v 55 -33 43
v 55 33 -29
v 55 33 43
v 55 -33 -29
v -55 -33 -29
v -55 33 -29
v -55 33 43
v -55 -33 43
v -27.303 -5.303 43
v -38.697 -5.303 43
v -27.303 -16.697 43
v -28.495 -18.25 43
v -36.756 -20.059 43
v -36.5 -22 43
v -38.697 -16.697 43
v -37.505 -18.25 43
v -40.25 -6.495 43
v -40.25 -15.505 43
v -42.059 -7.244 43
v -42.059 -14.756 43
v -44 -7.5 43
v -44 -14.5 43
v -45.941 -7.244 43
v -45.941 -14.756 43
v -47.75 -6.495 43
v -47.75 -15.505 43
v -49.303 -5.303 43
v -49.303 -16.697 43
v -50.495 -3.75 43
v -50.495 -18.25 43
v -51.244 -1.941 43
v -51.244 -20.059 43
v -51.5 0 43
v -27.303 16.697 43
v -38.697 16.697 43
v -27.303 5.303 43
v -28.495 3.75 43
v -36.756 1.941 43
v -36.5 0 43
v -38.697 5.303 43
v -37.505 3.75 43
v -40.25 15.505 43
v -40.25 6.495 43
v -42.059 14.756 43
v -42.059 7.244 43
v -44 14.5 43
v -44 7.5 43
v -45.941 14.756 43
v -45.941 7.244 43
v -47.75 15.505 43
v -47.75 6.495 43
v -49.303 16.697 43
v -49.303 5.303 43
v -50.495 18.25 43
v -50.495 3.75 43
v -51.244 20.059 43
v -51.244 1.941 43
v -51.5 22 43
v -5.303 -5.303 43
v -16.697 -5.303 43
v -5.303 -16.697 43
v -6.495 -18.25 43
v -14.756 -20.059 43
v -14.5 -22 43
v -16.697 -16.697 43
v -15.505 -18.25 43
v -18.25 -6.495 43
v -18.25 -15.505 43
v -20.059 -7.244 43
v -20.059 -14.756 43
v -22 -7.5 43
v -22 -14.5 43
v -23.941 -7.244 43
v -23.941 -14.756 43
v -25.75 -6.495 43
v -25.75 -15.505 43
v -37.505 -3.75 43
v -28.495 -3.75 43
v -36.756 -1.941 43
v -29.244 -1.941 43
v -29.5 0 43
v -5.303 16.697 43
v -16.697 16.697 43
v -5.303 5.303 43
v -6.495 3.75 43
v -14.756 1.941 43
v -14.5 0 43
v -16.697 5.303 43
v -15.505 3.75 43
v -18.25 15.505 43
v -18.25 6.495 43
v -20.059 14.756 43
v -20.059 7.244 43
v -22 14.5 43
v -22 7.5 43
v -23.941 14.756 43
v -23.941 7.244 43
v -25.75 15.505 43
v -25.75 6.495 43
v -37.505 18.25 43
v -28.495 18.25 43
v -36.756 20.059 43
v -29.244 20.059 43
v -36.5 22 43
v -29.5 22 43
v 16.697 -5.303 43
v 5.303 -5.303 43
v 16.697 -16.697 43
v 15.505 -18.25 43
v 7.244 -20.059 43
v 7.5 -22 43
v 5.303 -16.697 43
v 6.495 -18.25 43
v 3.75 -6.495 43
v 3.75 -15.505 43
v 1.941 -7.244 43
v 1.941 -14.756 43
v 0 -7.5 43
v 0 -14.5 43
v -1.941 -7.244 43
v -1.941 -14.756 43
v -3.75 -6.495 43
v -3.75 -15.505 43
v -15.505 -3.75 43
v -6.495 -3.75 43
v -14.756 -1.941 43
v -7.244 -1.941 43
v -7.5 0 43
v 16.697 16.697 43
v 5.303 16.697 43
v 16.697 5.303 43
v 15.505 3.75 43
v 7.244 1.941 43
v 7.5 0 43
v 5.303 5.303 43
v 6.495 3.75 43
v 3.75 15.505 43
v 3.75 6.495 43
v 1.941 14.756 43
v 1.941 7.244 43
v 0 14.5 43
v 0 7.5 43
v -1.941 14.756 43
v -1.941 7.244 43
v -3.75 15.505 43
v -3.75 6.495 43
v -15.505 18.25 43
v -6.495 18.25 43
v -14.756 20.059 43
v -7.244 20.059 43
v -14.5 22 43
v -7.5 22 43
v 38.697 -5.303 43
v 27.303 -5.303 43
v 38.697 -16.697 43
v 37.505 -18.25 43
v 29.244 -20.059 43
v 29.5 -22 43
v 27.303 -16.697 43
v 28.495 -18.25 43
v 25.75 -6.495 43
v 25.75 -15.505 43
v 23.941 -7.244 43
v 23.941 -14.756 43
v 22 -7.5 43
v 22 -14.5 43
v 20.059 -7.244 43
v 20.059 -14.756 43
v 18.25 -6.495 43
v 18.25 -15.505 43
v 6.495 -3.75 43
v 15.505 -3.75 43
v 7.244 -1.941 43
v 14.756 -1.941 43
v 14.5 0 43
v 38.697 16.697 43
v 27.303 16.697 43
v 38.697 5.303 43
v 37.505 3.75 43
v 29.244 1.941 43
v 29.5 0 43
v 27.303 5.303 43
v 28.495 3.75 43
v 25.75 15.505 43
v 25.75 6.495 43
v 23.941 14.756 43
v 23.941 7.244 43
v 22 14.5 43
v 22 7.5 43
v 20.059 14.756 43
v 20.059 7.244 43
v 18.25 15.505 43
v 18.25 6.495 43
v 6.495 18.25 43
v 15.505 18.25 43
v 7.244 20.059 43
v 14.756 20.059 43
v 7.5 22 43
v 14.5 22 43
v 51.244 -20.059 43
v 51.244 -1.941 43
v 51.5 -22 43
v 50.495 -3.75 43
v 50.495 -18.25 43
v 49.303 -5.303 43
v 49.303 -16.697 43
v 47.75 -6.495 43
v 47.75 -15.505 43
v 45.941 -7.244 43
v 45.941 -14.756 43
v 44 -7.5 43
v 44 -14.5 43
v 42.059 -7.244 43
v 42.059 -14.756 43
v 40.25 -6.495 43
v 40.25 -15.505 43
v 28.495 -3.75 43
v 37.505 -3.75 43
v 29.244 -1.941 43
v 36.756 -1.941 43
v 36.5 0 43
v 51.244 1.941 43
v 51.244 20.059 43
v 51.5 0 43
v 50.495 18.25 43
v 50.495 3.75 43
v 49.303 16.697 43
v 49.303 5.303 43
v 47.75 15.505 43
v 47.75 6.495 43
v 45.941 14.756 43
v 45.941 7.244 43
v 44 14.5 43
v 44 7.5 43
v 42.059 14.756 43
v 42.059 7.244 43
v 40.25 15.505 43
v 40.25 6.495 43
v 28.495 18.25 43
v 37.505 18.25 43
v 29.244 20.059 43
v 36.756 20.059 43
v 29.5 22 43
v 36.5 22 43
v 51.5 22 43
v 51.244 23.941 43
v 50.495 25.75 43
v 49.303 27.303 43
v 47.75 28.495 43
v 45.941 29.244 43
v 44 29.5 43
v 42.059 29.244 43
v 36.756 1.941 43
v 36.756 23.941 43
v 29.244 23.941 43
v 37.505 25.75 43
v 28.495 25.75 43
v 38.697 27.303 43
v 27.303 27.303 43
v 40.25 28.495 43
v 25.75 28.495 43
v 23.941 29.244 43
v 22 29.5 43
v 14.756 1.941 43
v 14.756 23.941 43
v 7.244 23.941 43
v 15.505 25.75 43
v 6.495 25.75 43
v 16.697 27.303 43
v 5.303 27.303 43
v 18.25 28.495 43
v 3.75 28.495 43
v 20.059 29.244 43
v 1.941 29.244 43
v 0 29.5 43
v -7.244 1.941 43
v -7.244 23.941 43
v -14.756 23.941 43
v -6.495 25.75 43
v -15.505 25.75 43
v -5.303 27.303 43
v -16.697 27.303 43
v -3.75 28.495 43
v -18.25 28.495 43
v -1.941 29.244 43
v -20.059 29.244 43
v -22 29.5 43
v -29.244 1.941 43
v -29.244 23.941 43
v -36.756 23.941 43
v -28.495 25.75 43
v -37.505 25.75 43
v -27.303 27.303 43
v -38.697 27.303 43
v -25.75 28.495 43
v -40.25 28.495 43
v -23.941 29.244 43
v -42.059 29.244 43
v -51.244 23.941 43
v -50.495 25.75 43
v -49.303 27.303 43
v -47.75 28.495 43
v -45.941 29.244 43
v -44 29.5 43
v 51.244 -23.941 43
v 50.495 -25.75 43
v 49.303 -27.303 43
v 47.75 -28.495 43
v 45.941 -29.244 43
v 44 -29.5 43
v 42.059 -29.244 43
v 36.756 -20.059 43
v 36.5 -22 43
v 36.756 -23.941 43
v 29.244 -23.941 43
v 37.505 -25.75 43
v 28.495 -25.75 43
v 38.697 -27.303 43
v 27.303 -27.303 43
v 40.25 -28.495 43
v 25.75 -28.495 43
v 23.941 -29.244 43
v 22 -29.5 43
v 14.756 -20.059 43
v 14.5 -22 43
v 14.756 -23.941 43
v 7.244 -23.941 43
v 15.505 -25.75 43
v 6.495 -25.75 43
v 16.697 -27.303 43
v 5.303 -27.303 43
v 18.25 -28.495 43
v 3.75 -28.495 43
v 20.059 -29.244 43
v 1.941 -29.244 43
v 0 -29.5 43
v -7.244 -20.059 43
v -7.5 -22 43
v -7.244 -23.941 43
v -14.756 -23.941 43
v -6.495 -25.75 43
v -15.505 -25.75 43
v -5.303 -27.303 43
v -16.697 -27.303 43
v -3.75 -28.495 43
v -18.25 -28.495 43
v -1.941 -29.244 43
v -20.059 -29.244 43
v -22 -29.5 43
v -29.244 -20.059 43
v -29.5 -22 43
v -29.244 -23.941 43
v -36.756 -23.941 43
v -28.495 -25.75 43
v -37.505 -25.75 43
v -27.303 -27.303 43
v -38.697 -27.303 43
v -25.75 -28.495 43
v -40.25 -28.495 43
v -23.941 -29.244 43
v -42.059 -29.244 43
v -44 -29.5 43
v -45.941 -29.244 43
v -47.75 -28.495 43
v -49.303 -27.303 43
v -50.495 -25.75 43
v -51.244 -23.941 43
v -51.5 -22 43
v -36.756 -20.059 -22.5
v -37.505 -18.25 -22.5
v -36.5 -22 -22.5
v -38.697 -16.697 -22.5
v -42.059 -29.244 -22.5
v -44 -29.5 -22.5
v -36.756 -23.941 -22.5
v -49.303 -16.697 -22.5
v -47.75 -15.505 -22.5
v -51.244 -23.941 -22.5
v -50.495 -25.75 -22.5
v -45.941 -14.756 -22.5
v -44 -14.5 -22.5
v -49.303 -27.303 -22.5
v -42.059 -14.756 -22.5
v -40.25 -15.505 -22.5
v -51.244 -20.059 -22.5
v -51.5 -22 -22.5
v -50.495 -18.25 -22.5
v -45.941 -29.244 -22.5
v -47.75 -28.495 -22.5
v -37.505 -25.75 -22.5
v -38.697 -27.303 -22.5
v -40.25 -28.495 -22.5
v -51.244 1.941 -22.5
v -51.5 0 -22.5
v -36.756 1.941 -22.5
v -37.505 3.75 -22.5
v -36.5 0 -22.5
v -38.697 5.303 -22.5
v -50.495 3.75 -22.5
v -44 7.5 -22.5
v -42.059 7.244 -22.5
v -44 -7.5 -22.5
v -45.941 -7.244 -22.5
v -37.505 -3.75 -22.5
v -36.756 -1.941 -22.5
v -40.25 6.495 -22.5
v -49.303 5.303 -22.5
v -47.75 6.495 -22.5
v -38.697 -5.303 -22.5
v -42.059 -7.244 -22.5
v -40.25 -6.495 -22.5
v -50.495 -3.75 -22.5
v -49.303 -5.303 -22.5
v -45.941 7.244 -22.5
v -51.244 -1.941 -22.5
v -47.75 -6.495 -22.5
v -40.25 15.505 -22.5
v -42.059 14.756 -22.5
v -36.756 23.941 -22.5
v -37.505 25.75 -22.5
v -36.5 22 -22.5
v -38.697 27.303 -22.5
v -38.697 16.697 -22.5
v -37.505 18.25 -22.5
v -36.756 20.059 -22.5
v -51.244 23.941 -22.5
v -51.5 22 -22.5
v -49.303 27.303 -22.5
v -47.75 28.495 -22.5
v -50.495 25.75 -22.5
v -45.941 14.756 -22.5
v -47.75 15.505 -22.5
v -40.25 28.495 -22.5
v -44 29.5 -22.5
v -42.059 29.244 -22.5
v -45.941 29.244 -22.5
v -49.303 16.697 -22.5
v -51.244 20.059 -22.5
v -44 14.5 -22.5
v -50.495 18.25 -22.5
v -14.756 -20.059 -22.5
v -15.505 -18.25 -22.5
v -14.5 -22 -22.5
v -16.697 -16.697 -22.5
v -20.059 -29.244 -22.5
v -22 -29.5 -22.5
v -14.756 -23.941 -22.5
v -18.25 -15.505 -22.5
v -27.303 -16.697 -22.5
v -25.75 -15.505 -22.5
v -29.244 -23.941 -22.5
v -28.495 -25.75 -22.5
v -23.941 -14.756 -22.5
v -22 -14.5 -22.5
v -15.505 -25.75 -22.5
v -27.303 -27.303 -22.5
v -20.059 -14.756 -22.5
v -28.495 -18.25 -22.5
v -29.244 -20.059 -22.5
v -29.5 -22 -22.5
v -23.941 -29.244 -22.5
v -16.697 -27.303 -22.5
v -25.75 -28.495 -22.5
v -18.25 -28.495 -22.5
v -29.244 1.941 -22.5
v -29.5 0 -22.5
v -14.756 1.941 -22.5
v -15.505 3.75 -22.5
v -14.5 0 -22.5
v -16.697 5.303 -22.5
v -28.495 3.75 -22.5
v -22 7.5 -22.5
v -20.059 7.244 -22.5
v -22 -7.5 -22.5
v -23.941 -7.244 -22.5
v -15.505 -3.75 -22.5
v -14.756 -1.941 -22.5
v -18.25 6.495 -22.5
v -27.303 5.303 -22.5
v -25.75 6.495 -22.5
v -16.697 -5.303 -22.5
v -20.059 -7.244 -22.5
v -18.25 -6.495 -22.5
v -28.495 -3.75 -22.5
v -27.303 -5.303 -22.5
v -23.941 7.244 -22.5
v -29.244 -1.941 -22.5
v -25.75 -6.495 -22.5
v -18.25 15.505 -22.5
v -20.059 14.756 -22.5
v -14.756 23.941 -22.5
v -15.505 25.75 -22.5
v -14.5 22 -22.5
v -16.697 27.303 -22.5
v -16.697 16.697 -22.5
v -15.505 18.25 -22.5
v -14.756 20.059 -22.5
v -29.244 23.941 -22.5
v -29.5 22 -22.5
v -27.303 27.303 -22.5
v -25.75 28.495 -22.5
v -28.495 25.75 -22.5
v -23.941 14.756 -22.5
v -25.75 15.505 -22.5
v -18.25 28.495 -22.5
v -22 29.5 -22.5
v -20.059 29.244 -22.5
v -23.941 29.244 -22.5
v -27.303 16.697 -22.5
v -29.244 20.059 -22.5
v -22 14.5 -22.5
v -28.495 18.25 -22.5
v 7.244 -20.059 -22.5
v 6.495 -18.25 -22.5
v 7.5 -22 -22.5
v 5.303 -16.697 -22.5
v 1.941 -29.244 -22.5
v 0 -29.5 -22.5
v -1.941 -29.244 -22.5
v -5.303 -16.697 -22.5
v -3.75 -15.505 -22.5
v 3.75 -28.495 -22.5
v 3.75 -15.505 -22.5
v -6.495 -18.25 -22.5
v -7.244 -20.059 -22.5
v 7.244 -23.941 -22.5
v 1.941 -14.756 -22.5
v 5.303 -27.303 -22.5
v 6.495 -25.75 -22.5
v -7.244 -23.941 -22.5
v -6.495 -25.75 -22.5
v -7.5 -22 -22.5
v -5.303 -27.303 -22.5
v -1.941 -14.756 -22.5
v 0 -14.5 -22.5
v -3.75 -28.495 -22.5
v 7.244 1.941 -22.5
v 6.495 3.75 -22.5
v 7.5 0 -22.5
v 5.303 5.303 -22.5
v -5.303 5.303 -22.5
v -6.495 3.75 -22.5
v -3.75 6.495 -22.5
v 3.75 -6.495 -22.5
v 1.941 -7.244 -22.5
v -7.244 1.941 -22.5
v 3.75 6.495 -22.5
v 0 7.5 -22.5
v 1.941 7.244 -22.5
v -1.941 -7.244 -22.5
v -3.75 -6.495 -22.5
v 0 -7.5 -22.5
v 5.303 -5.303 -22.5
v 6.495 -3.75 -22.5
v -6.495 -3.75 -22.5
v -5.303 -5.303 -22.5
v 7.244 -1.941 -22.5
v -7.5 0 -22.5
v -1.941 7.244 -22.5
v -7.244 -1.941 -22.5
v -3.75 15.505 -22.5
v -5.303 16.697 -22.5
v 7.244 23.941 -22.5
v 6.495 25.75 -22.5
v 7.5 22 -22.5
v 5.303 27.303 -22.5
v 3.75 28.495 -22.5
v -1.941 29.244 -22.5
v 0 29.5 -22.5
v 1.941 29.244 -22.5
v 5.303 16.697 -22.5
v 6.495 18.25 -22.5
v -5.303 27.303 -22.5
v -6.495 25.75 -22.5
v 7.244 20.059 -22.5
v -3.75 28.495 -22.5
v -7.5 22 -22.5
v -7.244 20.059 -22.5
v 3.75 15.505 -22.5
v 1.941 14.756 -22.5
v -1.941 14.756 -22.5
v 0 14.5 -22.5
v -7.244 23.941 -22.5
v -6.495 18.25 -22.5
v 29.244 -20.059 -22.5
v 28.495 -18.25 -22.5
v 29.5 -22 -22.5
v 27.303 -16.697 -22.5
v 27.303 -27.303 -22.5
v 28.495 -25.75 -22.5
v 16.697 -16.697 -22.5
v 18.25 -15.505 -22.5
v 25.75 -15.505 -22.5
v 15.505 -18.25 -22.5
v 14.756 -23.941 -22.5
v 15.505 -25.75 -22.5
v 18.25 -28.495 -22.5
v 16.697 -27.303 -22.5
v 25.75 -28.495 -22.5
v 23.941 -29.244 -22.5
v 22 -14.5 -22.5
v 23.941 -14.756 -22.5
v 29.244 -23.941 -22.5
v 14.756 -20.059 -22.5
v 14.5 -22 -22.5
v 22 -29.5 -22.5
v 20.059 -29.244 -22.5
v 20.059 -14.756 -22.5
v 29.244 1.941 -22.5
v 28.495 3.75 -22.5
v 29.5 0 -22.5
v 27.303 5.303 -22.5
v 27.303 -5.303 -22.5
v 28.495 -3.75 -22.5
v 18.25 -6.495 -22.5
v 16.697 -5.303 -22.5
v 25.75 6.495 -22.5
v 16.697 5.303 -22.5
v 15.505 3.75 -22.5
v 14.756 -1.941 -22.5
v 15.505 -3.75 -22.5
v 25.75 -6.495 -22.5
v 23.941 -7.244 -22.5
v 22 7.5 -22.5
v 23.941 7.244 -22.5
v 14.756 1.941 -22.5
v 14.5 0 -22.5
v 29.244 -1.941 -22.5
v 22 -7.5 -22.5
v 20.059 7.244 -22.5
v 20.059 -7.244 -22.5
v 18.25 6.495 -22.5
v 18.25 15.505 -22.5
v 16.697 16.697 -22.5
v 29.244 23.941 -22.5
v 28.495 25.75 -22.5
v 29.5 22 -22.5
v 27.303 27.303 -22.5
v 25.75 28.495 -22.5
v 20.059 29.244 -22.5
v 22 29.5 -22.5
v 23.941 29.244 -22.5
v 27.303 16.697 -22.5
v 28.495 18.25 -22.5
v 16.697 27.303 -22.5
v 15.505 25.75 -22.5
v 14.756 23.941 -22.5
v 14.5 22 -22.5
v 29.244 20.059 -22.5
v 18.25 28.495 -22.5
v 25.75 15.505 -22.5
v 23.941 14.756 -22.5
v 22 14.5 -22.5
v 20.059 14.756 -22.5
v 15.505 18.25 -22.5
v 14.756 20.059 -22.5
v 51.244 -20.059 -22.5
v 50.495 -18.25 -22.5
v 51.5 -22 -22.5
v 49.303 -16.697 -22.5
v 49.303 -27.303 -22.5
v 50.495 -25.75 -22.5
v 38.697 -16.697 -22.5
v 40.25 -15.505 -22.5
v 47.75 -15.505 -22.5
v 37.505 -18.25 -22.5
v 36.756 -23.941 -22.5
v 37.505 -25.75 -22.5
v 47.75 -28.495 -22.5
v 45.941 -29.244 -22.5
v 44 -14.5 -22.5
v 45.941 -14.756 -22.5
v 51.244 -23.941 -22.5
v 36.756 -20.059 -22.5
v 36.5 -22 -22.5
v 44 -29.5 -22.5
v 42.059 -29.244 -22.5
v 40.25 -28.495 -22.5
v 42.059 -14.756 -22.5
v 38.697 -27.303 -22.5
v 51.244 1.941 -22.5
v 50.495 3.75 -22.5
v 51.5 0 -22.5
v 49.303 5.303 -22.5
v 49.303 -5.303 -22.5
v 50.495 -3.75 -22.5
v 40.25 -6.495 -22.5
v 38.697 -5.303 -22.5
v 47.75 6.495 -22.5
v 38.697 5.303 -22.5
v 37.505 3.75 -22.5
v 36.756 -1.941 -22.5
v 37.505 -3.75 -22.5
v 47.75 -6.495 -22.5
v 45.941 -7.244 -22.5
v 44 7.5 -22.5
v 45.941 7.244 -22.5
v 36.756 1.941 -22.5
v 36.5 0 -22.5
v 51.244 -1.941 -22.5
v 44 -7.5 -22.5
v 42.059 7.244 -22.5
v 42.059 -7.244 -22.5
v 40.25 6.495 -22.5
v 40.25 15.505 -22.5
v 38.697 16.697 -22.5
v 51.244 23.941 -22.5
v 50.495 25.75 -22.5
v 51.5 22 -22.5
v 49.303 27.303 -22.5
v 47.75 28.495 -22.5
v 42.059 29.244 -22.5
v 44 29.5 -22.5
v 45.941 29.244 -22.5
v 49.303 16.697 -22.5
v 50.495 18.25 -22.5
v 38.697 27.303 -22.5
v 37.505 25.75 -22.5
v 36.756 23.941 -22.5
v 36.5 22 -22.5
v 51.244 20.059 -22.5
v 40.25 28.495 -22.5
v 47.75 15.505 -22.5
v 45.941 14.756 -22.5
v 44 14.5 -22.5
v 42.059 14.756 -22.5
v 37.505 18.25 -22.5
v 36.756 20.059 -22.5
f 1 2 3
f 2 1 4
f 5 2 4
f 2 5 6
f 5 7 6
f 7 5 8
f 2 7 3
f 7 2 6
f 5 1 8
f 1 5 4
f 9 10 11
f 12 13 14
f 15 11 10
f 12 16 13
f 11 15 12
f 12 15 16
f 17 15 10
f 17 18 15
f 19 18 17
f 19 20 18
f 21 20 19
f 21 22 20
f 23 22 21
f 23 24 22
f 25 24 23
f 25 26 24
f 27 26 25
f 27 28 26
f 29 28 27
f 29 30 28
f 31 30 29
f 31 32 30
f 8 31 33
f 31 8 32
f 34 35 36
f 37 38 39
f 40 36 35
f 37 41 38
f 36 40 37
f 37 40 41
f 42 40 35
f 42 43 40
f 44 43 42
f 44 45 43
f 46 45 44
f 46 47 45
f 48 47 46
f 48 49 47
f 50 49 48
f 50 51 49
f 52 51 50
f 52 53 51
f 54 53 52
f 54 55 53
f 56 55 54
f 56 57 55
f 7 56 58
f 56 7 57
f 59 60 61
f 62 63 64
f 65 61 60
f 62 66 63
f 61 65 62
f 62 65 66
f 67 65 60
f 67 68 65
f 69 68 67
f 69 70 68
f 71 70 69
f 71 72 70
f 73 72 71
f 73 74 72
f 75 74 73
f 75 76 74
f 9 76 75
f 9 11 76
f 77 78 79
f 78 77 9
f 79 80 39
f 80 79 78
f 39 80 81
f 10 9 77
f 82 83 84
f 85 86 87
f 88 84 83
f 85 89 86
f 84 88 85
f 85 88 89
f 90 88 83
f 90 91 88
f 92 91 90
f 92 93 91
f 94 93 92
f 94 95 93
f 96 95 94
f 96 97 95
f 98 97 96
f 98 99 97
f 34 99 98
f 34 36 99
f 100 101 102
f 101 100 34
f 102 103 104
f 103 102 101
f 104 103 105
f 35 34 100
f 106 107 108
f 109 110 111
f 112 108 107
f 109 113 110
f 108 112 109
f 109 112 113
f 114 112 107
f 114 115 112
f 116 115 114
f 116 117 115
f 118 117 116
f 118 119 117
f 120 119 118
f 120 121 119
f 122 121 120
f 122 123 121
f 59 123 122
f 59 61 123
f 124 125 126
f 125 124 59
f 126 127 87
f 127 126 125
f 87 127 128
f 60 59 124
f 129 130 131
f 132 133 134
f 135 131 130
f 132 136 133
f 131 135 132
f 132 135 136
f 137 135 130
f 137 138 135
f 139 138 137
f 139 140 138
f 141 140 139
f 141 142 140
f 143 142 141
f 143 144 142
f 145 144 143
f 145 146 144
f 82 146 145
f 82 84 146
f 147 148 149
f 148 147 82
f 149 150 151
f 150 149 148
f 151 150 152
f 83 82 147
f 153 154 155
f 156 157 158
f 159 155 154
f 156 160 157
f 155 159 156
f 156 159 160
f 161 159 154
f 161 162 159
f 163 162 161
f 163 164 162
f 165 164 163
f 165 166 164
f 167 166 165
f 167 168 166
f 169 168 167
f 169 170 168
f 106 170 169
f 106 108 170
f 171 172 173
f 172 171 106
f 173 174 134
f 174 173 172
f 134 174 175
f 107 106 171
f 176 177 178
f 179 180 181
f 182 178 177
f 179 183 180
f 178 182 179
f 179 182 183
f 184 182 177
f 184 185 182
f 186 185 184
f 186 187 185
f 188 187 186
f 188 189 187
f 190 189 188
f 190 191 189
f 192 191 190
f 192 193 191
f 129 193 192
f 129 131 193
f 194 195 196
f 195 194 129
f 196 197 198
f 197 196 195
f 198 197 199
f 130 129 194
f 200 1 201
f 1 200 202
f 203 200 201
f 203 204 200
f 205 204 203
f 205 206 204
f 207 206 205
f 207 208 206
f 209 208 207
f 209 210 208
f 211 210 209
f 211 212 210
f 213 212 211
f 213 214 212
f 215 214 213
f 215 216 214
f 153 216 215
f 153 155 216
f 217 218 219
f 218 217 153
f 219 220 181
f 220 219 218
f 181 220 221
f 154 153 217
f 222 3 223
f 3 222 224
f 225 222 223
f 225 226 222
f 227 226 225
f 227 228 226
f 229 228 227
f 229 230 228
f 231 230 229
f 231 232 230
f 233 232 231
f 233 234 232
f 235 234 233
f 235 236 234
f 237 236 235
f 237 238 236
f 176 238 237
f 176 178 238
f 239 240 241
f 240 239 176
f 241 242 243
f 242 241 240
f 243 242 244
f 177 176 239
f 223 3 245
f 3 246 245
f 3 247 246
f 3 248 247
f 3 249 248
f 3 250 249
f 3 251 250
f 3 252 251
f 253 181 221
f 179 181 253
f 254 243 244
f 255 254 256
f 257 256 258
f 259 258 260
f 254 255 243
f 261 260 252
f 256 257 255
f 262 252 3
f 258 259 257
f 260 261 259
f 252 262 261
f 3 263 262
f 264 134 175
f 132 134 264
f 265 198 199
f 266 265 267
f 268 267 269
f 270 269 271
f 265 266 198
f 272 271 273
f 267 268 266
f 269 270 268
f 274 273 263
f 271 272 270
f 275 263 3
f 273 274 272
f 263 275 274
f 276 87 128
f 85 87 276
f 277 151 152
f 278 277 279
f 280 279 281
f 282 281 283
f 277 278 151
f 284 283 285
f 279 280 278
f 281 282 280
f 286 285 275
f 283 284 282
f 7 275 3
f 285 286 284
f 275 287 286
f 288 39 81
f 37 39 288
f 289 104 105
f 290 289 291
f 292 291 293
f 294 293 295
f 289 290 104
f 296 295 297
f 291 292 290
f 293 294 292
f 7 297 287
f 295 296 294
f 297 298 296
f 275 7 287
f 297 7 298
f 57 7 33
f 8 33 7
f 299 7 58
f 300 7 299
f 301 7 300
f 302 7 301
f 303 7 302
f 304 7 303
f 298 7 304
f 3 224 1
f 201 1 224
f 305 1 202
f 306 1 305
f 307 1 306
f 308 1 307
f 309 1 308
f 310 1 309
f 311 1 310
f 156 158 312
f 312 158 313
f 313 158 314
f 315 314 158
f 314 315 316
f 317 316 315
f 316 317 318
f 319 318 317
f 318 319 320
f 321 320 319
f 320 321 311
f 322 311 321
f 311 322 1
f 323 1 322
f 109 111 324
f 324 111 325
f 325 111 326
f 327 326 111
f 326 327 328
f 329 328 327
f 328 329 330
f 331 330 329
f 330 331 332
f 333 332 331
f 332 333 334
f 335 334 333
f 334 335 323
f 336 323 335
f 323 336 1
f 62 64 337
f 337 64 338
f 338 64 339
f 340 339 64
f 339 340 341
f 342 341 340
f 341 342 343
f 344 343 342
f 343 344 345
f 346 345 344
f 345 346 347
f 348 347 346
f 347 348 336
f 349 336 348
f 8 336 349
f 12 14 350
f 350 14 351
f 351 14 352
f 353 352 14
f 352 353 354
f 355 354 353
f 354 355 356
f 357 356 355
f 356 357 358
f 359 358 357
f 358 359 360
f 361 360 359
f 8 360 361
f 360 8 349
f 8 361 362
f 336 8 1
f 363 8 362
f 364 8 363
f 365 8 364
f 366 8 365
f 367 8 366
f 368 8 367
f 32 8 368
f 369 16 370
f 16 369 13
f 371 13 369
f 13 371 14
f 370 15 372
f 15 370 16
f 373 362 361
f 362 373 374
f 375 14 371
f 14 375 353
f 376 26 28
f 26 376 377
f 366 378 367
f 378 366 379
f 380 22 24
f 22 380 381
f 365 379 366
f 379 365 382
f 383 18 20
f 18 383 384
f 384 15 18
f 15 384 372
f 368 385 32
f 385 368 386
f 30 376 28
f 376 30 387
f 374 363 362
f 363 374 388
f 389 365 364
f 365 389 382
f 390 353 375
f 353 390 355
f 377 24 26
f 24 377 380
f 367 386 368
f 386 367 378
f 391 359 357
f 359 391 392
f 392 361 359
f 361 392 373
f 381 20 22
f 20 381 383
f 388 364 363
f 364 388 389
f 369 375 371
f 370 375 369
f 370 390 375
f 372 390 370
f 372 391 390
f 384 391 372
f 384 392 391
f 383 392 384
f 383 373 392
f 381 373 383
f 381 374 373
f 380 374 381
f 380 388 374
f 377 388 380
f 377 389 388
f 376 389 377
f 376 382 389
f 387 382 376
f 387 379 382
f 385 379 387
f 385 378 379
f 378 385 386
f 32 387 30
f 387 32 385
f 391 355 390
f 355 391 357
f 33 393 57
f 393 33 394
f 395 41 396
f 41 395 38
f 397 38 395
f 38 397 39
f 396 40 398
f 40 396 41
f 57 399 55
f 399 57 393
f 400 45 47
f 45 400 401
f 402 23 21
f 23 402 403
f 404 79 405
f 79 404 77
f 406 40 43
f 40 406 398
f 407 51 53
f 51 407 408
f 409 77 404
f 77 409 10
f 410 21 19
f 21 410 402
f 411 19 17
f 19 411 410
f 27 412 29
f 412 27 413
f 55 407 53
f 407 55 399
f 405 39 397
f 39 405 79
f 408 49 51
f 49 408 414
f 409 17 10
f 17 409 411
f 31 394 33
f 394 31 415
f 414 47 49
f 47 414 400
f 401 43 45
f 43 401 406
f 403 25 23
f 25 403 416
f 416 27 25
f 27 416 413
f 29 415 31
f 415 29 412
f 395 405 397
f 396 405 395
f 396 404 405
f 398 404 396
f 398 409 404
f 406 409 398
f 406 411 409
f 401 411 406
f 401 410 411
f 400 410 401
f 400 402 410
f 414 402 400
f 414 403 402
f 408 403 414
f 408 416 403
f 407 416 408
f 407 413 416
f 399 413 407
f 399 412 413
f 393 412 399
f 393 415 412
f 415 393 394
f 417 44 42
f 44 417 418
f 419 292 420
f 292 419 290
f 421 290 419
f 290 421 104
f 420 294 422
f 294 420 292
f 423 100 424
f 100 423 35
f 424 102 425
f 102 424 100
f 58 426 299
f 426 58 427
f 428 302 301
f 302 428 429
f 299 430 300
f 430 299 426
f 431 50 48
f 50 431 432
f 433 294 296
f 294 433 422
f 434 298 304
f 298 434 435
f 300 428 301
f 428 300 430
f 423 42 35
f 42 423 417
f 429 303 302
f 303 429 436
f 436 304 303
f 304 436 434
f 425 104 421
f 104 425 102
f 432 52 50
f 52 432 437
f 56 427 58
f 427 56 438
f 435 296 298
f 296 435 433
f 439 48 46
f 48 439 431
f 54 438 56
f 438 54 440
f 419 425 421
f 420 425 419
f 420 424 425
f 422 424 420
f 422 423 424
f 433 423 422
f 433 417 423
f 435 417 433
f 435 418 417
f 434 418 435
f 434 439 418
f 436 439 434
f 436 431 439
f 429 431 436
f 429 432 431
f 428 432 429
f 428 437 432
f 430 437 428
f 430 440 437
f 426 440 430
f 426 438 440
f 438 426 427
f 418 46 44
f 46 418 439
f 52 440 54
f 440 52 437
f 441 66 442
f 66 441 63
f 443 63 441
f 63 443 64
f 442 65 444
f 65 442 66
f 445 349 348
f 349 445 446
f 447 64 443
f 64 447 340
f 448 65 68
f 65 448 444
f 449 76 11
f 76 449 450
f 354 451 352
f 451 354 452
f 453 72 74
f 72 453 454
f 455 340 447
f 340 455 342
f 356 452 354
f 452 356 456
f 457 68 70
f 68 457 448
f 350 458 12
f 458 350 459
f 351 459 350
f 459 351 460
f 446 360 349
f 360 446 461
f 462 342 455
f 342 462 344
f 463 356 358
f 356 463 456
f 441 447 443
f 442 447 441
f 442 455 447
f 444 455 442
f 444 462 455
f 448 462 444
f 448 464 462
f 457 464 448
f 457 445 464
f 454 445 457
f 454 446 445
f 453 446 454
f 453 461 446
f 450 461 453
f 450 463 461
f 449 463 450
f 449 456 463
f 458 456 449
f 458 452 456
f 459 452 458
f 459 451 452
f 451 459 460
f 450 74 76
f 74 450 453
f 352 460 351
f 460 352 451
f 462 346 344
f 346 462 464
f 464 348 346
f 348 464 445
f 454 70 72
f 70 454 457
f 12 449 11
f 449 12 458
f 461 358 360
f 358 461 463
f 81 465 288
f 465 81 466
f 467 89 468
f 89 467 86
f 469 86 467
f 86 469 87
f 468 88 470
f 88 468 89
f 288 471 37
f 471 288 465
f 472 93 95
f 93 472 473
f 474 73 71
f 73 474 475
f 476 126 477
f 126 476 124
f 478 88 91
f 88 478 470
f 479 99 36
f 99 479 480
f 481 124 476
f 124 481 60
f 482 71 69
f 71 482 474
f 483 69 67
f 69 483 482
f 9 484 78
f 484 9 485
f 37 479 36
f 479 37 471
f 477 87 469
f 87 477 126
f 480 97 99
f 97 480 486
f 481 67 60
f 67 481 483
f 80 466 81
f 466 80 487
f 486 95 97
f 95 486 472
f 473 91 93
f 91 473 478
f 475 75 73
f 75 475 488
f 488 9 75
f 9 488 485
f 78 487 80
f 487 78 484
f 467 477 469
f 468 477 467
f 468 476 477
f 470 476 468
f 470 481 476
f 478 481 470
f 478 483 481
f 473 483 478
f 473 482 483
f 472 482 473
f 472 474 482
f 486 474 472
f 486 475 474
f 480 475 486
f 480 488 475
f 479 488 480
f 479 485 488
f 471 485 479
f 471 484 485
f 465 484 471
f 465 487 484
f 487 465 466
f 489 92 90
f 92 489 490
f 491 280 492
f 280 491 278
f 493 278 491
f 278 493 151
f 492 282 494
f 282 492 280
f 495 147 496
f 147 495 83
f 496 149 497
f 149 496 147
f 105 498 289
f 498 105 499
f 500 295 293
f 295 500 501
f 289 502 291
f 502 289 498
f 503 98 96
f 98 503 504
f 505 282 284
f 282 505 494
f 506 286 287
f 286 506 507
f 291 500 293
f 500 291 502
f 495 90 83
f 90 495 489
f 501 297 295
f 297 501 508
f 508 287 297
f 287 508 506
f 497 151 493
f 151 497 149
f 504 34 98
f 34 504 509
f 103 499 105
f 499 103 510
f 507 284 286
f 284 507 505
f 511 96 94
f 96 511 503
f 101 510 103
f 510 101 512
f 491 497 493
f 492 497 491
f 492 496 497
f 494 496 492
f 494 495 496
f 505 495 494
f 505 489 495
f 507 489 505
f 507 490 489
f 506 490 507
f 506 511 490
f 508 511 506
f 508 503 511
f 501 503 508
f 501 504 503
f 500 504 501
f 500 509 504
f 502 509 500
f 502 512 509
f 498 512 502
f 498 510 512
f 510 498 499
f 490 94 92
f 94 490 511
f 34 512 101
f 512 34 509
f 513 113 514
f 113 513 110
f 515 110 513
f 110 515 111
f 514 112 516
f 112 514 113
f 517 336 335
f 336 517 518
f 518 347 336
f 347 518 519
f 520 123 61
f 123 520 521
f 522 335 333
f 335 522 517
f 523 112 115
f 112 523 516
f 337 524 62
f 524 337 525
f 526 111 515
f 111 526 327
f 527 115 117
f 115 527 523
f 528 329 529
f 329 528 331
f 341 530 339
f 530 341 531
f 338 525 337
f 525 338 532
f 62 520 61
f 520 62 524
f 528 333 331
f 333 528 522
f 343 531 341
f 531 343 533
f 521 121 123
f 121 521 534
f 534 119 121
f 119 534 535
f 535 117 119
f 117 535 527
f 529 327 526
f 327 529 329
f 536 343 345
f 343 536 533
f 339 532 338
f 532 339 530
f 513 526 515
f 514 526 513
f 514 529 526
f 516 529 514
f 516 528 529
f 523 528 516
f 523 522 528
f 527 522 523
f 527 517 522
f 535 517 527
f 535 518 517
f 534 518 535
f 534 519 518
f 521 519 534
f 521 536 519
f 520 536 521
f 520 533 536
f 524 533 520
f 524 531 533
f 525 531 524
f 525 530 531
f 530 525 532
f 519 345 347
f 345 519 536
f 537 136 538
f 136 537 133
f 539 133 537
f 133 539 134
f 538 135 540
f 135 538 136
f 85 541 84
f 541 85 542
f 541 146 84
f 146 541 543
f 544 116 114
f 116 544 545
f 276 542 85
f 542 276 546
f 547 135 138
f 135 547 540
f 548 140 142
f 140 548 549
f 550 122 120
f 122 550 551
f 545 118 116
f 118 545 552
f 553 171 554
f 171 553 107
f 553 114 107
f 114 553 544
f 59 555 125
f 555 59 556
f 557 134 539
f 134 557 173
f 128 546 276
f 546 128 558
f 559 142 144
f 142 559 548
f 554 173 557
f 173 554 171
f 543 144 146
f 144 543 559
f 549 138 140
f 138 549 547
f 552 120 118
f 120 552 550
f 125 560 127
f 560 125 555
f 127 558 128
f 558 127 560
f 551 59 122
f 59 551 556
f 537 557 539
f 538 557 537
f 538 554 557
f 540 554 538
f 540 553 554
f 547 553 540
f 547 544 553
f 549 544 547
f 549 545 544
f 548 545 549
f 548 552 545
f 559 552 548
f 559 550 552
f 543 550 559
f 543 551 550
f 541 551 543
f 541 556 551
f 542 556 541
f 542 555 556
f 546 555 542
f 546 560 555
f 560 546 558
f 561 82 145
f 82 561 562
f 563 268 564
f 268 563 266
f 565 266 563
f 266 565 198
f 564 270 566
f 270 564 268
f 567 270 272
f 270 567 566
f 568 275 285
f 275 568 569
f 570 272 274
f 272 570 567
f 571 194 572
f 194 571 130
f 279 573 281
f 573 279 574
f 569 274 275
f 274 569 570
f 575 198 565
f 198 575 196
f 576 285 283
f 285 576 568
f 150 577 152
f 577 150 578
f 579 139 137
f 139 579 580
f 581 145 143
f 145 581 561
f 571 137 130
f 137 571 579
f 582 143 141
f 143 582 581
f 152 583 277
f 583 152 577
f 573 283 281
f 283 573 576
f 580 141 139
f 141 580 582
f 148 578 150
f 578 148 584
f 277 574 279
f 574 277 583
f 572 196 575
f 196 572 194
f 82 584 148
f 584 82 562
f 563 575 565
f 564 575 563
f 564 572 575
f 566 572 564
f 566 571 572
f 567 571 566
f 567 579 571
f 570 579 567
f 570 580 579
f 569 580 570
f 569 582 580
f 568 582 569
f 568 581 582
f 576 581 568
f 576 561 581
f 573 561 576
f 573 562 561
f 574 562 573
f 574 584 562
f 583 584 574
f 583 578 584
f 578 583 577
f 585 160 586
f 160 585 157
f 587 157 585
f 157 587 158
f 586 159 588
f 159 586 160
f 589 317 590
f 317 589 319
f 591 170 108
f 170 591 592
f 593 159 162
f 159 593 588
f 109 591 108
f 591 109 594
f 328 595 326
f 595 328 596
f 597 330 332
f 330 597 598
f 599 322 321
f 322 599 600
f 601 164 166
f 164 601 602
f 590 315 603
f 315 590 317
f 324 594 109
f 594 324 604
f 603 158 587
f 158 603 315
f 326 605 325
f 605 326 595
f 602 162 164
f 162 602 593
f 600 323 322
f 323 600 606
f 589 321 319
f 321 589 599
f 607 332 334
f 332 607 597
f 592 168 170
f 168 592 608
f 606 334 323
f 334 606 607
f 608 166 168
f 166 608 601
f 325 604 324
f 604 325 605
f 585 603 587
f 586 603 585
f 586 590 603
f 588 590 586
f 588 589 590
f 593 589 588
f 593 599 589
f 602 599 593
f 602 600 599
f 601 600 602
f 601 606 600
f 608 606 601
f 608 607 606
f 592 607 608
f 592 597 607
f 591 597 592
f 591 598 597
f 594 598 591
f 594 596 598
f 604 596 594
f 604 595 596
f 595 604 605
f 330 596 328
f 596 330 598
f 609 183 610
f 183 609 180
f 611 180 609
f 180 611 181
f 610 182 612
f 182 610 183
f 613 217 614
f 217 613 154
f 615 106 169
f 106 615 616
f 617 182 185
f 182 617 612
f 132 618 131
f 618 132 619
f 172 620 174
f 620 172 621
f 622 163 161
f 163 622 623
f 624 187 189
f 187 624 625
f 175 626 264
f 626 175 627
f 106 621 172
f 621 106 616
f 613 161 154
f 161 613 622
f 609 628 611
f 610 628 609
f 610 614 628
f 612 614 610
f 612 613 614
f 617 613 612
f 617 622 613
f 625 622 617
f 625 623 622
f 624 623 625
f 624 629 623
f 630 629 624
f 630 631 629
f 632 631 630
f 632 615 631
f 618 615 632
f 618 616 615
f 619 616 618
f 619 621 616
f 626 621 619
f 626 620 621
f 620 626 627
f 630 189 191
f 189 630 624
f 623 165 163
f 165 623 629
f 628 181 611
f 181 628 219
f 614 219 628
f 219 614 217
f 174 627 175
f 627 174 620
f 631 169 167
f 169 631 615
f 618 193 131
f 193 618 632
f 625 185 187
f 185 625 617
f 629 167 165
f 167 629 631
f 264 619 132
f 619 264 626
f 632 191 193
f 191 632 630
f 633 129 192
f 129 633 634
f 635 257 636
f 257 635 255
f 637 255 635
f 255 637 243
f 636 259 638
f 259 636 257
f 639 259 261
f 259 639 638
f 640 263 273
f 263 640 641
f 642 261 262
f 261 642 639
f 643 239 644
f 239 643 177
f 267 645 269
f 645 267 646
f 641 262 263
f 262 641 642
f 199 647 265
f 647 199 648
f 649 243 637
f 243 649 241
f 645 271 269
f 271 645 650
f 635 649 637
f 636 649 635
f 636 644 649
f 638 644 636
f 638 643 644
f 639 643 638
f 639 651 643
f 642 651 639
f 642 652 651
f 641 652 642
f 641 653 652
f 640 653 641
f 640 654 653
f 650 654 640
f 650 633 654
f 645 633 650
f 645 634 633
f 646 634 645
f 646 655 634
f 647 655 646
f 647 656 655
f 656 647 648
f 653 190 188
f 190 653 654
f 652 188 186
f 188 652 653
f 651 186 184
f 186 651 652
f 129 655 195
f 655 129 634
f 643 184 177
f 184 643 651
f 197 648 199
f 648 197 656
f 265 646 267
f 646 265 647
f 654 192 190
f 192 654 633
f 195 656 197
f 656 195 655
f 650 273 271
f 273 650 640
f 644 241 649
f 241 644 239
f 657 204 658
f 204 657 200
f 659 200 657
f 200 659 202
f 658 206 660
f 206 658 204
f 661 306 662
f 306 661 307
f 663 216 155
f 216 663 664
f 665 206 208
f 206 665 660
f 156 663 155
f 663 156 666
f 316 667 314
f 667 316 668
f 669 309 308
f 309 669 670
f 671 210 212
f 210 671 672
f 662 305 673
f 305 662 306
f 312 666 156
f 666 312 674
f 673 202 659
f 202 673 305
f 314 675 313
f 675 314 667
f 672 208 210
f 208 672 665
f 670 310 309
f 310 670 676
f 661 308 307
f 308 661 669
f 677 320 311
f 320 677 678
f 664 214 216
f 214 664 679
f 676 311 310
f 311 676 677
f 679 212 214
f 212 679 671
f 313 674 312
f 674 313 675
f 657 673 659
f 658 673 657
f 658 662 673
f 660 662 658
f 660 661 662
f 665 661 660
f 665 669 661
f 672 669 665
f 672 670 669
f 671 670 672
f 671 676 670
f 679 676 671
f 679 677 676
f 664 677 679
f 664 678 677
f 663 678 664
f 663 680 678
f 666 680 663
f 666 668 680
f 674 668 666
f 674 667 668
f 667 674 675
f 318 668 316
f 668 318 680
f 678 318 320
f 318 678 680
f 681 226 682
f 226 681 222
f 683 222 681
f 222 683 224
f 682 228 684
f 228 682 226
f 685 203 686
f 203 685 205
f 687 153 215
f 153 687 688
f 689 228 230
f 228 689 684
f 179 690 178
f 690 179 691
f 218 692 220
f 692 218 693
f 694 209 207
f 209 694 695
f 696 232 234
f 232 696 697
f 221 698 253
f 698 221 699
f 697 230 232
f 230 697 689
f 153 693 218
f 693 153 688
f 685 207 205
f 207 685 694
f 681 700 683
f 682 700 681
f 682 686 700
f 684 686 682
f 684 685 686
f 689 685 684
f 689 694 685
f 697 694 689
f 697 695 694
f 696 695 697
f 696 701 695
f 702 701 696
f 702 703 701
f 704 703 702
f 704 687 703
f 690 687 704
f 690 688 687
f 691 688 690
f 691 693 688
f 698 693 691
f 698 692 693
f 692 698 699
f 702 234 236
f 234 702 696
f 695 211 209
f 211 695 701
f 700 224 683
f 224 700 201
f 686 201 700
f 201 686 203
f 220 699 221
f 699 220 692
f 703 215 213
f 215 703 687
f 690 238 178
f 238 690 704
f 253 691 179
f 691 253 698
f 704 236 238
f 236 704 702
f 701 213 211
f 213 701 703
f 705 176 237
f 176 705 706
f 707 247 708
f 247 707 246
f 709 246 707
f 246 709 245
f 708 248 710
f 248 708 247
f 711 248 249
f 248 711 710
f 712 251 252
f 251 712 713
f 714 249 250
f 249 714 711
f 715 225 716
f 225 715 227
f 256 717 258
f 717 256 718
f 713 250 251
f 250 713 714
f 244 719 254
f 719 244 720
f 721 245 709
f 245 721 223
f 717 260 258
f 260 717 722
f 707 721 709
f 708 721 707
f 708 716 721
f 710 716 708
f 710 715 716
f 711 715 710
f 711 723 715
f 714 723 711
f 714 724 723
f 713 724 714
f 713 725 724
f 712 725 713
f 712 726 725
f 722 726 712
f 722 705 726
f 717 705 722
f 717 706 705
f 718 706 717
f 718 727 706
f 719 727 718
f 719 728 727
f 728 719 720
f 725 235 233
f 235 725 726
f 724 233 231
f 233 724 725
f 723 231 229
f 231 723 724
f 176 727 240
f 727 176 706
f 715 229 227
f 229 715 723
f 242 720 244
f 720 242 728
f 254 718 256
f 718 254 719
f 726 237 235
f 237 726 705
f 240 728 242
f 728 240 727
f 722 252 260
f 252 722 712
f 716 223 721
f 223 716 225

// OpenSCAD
// 3DScad sample: laboratory test tube rack (5 x 3 wells)
// Uses only the currently round-trippable subset.

module scene_model() {
    cols = 5;
    rows = 3;
    tube_pitch = 22;
    tube_r = 7.5;
    block_h = 58;
    top_h = 14;

    difference() {
        union() {
            cube([cols * tube_pitch, rows * tube_pitch, block_h], center=true);
            translate([0, 0, block_h / 2 + top_h / 2]) {
                cube([cols * tube_pitch, rows * tube_pitch, top_h], center=true);
            }
        }
        for (ix = [0 : 1 : cols - 1]) {
            for (iy = [0 : 1 : rows - 1]) {
                translate([-(cols - 1) * tube_pitch / 2 + ix * tube_pitch, -(rows - 1) * tube_pitch / 2 + iy * tube_pitch, block_h / 4]) {
                    cylinder(h=block_h + top_h + 2, r=tube_r, center=true);
                }
            }
        }
    }
}

scene_model();
